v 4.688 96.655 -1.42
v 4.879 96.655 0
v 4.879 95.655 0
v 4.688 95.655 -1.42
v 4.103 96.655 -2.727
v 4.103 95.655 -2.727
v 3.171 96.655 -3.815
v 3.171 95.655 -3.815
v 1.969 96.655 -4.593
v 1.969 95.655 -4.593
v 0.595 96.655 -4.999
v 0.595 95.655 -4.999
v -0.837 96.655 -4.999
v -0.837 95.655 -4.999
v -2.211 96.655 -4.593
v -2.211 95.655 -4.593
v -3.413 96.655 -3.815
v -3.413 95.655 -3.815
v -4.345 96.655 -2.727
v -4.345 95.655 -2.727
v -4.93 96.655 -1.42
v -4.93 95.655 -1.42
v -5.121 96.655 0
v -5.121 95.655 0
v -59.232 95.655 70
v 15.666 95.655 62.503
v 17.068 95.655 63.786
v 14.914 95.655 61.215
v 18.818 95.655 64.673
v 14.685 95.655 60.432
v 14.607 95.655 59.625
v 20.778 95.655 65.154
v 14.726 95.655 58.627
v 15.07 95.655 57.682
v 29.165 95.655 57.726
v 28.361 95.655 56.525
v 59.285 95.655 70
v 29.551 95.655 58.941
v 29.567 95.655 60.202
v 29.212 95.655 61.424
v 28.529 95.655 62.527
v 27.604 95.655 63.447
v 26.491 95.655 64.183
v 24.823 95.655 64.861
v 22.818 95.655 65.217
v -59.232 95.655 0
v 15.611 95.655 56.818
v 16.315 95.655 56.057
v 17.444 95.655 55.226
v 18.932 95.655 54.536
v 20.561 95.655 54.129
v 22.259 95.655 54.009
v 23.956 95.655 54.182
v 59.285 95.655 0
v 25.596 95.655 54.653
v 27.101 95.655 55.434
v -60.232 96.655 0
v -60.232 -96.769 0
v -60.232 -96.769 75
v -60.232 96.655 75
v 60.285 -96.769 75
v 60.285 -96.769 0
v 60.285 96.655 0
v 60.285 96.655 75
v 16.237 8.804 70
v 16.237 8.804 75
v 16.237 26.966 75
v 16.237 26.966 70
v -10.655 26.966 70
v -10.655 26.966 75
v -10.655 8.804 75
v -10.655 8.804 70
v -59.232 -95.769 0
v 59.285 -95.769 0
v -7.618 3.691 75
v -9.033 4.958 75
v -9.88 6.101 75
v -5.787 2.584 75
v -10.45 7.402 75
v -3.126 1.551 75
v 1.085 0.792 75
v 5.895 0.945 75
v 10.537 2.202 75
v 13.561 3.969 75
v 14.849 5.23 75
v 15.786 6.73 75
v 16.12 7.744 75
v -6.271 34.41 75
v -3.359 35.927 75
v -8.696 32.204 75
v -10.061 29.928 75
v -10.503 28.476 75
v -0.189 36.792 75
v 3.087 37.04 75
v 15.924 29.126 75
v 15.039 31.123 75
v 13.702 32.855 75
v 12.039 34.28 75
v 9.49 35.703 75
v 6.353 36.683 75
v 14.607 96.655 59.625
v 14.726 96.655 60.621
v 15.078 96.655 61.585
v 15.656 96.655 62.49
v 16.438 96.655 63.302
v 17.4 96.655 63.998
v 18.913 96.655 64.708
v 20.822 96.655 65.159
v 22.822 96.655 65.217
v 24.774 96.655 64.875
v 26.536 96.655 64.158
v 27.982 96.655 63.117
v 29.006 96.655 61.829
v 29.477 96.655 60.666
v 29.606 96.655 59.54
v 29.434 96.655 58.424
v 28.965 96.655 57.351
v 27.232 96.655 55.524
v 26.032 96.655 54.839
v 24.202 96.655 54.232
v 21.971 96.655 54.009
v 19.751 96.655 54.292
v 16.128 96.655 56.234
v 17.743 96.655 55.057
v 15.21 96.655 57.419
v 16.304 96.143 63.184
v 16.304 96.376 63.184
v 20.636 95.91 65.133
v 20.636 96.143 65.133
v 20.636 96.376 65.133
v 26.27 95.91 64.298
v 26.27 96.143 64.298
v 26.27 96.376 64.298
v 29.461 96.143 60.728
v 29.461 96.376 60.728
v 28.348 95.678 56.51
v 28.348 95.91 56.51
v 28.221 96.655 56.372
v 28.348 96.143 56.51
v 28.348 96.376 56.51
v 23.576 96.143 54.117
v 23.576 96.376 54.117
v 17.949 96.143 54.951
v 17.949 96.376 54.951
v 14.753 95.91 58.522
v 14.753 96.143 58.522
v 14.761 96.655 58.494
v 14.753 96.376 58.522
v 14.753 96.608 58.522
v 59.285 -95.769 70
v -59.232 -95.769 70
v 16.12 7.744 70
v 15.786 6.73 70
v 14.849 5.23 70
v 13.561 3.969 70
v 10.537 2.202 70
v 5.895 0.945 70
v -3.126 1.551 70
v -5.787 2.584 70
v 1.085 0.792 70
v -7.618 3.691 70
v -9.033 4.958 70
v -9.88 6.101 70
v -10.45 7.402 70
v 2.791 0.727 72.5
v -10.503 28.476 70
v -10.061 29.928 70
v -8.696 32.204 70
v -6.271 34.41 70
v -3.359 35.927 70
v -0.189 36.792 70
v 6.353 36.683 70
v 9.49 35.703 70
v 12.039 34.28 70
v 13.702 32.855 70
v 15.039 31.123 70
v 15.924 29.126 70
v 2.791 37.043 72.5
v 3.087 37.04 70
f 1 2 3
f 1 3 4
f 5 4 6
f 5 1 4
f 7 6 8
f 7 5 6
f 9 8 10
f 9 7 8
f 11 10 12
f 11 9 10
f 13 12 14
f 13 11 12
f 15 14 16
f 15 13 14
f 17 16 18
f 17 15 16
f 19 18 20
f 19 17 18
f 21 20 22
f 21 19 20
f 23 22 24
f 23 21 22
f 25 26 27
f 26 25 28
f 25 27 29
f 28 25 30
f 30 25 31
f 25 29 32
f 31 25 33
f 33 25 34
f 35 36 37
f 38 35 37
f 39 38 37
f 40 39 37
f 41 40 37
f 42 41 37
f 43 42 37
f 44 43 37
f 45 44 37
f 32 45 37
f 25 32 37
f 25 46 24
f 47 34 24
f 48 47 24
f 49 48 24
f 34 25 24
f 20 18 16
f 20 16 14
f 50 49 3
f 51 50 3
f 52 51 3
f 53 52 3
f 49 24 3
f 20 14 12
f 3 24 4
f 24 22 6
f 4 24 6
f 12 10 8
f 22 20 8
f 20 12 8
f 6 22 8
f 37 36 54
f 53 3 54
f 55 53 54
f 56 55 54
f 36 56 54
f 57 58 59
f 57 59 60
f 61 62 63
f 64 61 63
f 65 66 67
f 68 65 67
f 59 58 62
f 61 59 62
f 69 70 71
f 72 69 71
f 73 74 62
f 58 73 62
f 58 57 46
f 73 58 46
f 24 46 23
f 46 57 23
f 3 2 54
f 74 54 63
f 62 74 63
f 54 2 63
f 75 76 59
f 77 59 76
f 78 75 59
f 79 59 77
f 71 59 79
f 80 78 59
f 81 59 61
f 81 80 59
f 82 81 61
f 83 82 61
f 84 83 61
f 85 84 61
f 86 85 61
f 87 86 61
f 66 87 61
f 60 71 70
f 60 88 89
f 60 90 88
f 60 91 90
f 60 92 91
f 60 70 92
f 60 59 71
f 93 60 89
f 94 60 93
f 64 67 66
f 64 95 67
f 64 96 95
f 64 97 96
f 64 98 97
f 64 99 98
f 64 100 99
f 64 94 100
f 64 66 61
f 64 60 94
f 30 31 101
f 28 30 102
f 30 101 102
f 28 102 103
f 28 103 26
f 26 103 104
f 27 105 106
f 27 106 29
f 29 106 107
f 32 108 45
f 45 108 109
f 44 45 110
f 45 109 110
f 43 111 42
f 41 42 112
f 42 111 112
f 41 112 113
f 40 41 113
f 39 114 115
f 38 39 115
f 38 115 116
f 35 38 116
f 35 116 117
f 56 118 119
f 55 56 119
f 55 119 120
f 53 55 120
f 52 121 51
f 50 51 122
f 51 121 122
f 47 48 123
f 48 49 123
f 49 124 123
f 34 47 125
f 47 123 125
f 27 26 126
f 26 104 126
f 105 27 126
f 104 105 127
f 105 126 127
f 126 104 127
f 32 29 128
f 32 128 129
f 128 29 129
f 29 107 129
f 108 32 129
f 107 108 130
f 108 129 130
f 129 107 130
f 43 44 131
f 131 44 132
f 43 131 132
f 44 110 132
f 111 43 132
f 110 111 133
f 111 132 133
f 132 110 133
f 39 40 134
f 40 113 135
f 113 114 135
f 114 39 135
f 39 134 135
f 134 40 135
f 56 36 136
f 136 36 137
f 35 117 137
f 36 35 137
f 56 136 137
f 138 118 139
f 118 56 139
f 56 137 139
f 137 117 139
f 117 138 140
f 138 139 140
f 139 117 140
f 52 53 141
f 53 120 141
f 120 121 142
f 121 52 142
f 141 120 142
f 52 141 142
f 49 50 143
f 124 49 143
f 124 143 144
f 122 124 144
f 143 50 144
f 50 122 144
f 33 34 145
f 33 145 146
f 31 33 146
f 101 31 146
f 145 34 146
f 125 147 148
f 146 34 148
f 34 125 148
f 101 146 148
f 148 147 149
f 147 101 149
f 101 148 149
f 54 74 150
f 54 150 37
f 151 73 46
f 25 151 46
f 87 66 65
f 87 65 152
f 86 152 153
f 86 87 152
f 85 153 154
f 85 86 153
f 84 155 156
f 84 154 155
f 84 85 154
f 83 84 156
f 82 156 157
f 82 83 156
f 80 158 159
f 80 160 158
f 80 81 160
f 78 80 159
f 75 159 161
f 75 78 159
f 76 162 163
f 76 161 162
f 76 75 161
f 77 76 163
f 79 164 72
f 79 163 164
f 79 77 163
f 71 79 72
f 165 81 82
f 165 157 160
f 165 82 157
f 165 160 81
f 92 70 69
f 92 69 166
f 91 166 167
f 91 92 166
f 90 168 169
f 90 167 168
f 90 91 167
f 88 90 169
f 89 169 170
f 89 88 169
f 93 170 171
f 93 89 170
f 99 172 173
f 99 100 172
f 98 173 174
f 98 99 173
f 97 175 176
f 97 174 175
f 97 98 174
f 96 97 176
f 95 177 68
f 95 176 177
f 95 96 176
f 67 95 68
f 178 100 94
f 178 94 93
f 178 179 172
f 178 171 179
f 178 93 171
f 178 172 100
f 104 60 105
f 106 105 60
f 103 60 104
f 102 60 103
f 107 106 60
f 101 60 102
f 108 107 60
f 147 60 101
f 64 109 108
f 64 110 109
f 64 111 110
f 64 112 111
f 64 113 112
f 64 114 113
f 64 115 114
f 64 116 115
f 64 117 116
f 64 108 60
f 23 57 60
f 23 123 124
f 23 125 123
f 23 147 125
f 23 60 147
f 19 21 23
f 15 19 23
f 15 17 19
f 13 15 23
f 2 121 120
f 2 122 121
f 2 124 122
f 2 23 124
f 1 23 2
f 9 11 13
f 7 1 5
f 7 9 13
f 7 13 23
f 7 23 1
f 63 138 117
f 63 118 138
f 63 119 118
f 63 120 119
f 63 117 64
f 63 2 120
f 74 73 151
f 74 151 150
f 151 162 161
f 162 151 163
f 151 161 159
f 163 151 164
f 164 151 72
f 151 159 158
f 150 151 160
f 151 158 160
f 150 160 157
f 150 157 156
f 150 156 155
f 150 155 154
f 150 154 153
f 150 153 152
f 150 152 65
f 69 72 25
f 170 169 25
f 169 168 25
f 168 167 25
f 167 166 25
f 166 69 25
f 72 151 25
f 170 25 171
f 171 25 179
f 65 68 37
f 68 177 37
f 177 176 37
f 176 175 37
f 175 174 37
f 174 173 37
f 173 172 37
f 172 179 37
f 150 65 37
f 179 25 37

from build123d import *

# Parameters (mm, degrees)
SKETCH1_W               = 120.517011816
SKETCH1_H               = 193.423301163
BOSS_EXTRUDE1_DEPTH     = 75
SKETCH1_3_W             = 118.517011816
SKETCH1_3_H             = 191.423301163
CUT_EXTRUDE1_DEPTH      = 70
BOSS_EXTRUDE2_DEPTH     = 1
CUT_EXTRUDE4_DEPTH      = 137.495747048
CUT_EXTRUDE4_DEPTH_BACK = 137.495747048
CUT_EXTRUDE6_DEPTH      = 10


with BuildPart() as part:
    # Sketch1 → Boss-Extrude1 (new body)
    with BuildSketch(Plane.XY):
        with Locations((0.026299542, -0.057021664)):
            Rectangle(SKETCH1_W, SKETCH1_H)
    extrude(amount=BOSS_EXTRUDE1_DEPTH)

    # Sketch1<3> → Cut-Extrude1 (cut)
    with BuildSketch(Plane.XY):
        with Locations((0.026299542, -0.057021664)):
            Rectangle(SKETCH1_3_W, SKETCH1_3_H)
    extrude(amount=CUT_EXTRUDE1_DEPTH, mode=Mode.SUBTRACT)

    # Sketch2 → Boss-Extrude2 (add)
    with BuildSketch(Plane(origin=(0, 96.654628917, 0), x_dir=(1, 0, 0), z_dir=(0, 1, 0))):
        with BuildLine():
            Line((-5.120692539, 0), (4.878786885, 0))
            ThreePointArc((4.878786885, 0), (-0.120952827, 5.051017752), (-5.120692539, 0))
        make_face()
    extrude(amount=-BOSS_EXTRUDE2_DEPTH)

    # Sketch4<2> → Cut-Extrude4 (cut, two sides: drawn at the far end of the back side and taken through both)
    with BuildSketch(Plane(origin=(0, 0, 70), x_dir=(-1, 0, 0), z_dir=(0, 0, -1)).offset(-CUT_EXTRUDE4_DEPTH_BACK)):
        with BuildLine():
            Line((-16.236705508, 8.803847843), (-16.236705508, 26.966349614))
            add(Edge.make_bspline(
                [(10.654600955, 26.966349614), (10.654600955, 37.042694246), (-2.791052277, 37.042694246), (-16.236705508, 37.042694246), (-16.236705508, 26.966349614)],
                knots=[3.141592654, 3.141592654, 3.141592654, 4.71238898, 4.71238898, 6.283185307, 6.283185307, 6.283185307], degree=2, weights=[1, 0.707106781, 1, 0.707106781, 1]))
            Line((10.654600955, 26.966349614), (10.654600955, 8.803847843))
            add(Edge.make_bspline(
                [(-16.236705508, 8.803847843), (-16.236705508, 0.726850718), (-2.791052277, 0.726850718), (10.654600955, 0.726850718), (10.654600955, 8.803847843)],
                knots=[0, 0, 0, 1.570796327, 1.570796327, 3.141592654, 3.141592654, 3.141592654], degree=2, weights=[1, 0.707106781, 1, 0.707106781, 1]))
        make_face()
    extrude(amount=CUT_EXTRUDE4_DEPTH + CUT_EXTRUDE4_DEPTH_BACK, mode=Mode.SUBTRACT)

    # Sketch6 → Cut-Extrude6 (cut, symmetric)
    with BuildSketch(Plane(origin=(0, 96.654628917, 0), x_dir=(1, 0, 0), z_dir=(0, 1, 0))):
        with BuildLine():
            add(Edge.make_bspline(
                [(14.607126744, -59.625274066), (14.607126744, -59.996423236), (14.655753616, -60.360654617), (14.797863596, -60.897161426), (14.856849596, -61.074344505), (14.9984446, -61.42534999), (15.081484622, -61.59993657), (15.36467279, -62.113067792), (15.595340891, -62.436179632), (16.002179988, -62.893279801), (16.148006268, -63.041018505), (16.460654262, -63.326982062), (16.627232407, -63.464794132), (17.147507806, -63.854923379), (17.524850755, -64.087300386), (18.13663611, -64.394273167), (18.349476527, -64.490080589), (18.784383, -64.664483705), (19.006061662, -64.743067855), (19.683439186, -64.953650763), (20.15136039, -65.060723061), (21.120984475, -65.205972716), (21.610951465, -65.242067863), (22.343801341, -65.24262469), (22.588258242, -65.23389357), (23.07752571, -65.198266478), (23.323602223, -65.171129385), (24.04825359, -65.063568363), (24.515989992, -64.95745801), (25.42125883, -64.677606952), (25.862082399, -64.501556566), (26.676946551, -64.094389908), (27.055163448, -63.862622522), (27.577987155, -63.47204045), (27.745226091, -63.334101772), (28.057458003, -63.04956749), (28.20337387, -62.902368403), (28.611107489, -62.446258784), (28.843853735, -62.121803074), (29.223293972, -61.437507678), (29.365303175, -61.086770508), (29.50923045, -60.548226995), (29.545607426, -60.366624344), (29.594557113, -59.999133521), (29.606945323, -59.813278674), (29.607483579, -59.261578321), (29.560066597, -58.897421315), (29.417460244, -58.356636708), (29.357535803, -58.176377178), (29.214631397, -57.822433786), (29.132057014, -57.649371871), (28.851902237, -57.14158682), (28.62220127, -56.818155033), (28.211284873, -56.35633663), (28.063808332, -56.207204664), (27.752933385, -55.923051914), (27.424862325, -55.651543664), (27.062811294, -55.405021279), (26.683482778, -55.171203227), (26.483999533, -55.060101063), (25.869660817, -54.752095839), (25.43867317, -54.579379415), (24.534710357, -54.297863736), (24.056862603, -54.188834821), (23.095878735, -54.045053542), (22.609683495, -54.008631963), (21.871731404, -54.007851656), (21.623217783, -54.016782482), (21.133474519, -54.052593794), (20.891228101, -54.079395605), (20.172200955, -54.185935333), (19.702248556, -54.291799913), (18.786992965, -54.574854931), (18.355286434, -54.747702842), (17.745137882, -55.052178339), (17.548036265, -55.161259722), (17.166702804, -55.394972905), (16.982301592, -55.51989473), (16.460673231, -55.909894482), (16.150371394, -56.192508636), (15.604234807, -56.802703679), (15.368452042, -57.132300307), (14.993164183, -57.809021831), (14.850249749, -58.159277139), (14.656312657, -58.884223774), (14.607126744, -59.254124896), (14.607126744, -59.625274066)],
                knots=[0, 0, 0, 0, 0.03125, 0.03125, 0.046875, 0.046875, 0.0625, 0.0625, 0.09375, 0.09375, 0.109375, 0.109375, 0.125, 0.125, 0.15625, 0.15625, 0.171875, 0.171875, 0.1875, 0.1875, 0.21875, 0.21875, 0.25, 0.25, 0.265625, 0.265625, 0.28125, 0.28125, 0.3125, 0.3125, 0.34375, 0.34375, 0.375, 0.375, 0.390625, 0.390625, 0.40625, 0.40625, 0.4375, 0.4375, 0.46875, 0.46875, 0.484375, 0.484375, 0.5, 0.5, 0.53125, 0.53125, 0.546875, 0.546875, 0.5625, 0.5625, 0.59375, 0.59375, 0.609375, 0.609375, 0.625, 0.640625, 0.640625, 0.65625, 0.65625, 0.6875, 0.6875, 0.71875, 0.71875, 0.75, 0.75, 0.765625, 0.765625, 0.78125, 0.78125, 0.8125, 0.8125, 0.84375, 0.84375, 0.859375, 0.859375, 0.875, 0.875, 0.90625, 0.90625, 0.9375, 0.9375, 0.96875, 0.96875, 1, 1, 1, 1], degree=3))
        make_face()
    extrude(amount=CUT_EXTRUDE6_DEPTH, both=True, mode=Mode.SUBTRACT)


solid = part.part
